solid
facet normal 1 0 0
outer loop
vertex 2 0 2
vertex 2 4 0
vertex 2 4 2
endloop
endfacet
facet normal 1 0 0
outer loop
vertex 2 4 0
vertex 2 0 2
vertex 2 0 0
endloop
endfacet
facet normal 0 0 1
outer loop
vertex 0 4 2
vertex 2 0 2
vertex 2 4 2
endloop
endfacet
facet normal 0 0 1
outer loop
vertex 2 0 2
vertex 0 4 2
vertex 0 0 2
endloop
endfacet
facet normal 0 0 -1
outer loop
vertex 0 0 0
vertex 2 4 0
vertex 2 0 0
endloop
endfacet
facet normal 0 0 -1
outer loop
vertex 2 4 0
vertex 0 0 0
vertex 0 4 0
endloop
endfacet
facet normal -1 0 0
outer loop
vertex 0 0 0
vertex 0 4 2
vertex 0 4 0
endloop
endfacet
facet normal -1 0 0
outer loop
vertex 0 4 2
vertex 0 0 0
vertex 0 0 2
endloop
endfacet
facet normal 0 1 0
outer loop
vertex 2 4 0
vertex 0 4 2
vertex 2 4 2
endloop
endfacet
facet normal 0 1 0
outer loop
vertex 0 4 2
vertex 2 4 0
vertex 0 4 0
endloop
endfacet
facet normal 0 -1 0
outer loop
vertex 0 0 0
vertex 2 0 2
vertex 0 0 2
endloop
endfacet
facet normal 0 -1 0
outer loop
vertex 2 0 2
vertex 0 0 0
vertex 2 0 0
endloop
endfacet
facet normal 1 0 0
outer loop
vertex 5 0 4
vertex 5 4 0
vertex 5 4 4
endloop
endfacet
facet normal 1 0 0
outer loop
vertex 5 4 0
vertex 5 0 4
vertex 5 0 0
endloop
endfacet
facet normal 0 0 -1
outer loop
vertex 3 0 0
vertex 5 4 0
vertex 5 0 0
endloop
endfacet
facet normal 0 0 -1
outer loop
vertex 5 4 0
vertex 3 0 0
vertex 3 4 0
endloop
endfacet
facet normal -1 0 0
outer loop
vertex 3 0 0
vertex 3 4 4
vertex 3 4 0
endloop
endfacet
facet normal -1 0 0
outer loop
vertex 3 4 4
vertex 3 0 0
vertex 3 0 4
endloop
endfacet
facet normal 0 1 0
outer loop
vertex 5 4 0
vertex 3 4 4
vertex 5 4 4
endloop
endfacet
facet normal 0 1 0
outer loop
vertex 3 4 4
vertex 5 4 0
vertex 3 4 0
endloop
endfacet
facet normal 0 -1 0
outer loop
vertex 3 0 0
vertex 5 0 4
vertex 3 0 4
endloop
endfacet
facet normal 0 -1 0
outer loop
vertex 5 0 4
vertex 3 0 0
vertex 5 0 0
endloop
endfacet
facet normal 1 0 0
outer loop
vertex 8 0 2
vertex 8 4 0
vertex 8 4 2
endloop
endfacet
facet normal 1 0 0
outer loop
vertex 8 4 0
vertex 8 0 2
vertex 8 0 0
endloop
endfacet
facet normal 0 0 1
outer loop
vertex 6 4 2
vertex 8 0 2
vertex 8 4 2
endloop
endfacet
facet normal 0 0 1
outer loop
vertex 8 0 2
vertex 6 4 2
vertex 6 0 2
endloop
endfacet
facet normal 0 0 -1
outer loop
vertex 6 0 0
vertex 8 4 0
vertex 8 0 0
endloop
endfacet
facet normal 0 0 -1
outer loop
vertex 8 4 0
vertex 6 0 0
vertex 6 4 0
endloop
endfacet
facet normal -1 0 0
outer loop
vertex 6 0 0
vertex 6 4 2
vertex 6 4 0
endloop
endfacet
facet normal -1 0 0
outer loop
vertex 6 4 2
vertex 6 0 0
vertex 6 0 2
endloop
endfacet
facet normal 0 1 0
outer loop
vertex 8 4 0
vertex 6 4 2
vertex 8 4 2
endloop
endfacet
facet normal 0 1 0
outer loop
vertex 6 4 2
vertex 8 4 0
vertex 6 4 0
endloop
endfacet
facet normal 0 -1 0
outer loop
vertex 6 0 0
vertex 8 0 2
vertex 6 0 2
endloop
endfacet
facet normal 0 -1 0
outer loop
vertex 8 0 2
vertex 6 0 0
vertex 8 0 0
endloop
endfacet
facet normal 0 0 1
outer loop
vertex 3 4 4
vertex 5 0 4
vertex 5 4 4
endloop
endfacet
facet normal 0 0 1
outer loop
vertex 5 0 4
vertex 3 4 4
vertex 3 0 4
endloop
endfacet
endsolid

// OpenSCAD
union() {
  translate([0, 0, 0]) cube(size=[2,4,2], center=false);
  translate([3, 0, 0]) cube(size=[2,4,2], center=false);
  translate([6, 0, 0]) cube(size=[2,4,2], center=false);

  translate([3, 0, 2]) cube(size=[2,4,2], center=false);
}
